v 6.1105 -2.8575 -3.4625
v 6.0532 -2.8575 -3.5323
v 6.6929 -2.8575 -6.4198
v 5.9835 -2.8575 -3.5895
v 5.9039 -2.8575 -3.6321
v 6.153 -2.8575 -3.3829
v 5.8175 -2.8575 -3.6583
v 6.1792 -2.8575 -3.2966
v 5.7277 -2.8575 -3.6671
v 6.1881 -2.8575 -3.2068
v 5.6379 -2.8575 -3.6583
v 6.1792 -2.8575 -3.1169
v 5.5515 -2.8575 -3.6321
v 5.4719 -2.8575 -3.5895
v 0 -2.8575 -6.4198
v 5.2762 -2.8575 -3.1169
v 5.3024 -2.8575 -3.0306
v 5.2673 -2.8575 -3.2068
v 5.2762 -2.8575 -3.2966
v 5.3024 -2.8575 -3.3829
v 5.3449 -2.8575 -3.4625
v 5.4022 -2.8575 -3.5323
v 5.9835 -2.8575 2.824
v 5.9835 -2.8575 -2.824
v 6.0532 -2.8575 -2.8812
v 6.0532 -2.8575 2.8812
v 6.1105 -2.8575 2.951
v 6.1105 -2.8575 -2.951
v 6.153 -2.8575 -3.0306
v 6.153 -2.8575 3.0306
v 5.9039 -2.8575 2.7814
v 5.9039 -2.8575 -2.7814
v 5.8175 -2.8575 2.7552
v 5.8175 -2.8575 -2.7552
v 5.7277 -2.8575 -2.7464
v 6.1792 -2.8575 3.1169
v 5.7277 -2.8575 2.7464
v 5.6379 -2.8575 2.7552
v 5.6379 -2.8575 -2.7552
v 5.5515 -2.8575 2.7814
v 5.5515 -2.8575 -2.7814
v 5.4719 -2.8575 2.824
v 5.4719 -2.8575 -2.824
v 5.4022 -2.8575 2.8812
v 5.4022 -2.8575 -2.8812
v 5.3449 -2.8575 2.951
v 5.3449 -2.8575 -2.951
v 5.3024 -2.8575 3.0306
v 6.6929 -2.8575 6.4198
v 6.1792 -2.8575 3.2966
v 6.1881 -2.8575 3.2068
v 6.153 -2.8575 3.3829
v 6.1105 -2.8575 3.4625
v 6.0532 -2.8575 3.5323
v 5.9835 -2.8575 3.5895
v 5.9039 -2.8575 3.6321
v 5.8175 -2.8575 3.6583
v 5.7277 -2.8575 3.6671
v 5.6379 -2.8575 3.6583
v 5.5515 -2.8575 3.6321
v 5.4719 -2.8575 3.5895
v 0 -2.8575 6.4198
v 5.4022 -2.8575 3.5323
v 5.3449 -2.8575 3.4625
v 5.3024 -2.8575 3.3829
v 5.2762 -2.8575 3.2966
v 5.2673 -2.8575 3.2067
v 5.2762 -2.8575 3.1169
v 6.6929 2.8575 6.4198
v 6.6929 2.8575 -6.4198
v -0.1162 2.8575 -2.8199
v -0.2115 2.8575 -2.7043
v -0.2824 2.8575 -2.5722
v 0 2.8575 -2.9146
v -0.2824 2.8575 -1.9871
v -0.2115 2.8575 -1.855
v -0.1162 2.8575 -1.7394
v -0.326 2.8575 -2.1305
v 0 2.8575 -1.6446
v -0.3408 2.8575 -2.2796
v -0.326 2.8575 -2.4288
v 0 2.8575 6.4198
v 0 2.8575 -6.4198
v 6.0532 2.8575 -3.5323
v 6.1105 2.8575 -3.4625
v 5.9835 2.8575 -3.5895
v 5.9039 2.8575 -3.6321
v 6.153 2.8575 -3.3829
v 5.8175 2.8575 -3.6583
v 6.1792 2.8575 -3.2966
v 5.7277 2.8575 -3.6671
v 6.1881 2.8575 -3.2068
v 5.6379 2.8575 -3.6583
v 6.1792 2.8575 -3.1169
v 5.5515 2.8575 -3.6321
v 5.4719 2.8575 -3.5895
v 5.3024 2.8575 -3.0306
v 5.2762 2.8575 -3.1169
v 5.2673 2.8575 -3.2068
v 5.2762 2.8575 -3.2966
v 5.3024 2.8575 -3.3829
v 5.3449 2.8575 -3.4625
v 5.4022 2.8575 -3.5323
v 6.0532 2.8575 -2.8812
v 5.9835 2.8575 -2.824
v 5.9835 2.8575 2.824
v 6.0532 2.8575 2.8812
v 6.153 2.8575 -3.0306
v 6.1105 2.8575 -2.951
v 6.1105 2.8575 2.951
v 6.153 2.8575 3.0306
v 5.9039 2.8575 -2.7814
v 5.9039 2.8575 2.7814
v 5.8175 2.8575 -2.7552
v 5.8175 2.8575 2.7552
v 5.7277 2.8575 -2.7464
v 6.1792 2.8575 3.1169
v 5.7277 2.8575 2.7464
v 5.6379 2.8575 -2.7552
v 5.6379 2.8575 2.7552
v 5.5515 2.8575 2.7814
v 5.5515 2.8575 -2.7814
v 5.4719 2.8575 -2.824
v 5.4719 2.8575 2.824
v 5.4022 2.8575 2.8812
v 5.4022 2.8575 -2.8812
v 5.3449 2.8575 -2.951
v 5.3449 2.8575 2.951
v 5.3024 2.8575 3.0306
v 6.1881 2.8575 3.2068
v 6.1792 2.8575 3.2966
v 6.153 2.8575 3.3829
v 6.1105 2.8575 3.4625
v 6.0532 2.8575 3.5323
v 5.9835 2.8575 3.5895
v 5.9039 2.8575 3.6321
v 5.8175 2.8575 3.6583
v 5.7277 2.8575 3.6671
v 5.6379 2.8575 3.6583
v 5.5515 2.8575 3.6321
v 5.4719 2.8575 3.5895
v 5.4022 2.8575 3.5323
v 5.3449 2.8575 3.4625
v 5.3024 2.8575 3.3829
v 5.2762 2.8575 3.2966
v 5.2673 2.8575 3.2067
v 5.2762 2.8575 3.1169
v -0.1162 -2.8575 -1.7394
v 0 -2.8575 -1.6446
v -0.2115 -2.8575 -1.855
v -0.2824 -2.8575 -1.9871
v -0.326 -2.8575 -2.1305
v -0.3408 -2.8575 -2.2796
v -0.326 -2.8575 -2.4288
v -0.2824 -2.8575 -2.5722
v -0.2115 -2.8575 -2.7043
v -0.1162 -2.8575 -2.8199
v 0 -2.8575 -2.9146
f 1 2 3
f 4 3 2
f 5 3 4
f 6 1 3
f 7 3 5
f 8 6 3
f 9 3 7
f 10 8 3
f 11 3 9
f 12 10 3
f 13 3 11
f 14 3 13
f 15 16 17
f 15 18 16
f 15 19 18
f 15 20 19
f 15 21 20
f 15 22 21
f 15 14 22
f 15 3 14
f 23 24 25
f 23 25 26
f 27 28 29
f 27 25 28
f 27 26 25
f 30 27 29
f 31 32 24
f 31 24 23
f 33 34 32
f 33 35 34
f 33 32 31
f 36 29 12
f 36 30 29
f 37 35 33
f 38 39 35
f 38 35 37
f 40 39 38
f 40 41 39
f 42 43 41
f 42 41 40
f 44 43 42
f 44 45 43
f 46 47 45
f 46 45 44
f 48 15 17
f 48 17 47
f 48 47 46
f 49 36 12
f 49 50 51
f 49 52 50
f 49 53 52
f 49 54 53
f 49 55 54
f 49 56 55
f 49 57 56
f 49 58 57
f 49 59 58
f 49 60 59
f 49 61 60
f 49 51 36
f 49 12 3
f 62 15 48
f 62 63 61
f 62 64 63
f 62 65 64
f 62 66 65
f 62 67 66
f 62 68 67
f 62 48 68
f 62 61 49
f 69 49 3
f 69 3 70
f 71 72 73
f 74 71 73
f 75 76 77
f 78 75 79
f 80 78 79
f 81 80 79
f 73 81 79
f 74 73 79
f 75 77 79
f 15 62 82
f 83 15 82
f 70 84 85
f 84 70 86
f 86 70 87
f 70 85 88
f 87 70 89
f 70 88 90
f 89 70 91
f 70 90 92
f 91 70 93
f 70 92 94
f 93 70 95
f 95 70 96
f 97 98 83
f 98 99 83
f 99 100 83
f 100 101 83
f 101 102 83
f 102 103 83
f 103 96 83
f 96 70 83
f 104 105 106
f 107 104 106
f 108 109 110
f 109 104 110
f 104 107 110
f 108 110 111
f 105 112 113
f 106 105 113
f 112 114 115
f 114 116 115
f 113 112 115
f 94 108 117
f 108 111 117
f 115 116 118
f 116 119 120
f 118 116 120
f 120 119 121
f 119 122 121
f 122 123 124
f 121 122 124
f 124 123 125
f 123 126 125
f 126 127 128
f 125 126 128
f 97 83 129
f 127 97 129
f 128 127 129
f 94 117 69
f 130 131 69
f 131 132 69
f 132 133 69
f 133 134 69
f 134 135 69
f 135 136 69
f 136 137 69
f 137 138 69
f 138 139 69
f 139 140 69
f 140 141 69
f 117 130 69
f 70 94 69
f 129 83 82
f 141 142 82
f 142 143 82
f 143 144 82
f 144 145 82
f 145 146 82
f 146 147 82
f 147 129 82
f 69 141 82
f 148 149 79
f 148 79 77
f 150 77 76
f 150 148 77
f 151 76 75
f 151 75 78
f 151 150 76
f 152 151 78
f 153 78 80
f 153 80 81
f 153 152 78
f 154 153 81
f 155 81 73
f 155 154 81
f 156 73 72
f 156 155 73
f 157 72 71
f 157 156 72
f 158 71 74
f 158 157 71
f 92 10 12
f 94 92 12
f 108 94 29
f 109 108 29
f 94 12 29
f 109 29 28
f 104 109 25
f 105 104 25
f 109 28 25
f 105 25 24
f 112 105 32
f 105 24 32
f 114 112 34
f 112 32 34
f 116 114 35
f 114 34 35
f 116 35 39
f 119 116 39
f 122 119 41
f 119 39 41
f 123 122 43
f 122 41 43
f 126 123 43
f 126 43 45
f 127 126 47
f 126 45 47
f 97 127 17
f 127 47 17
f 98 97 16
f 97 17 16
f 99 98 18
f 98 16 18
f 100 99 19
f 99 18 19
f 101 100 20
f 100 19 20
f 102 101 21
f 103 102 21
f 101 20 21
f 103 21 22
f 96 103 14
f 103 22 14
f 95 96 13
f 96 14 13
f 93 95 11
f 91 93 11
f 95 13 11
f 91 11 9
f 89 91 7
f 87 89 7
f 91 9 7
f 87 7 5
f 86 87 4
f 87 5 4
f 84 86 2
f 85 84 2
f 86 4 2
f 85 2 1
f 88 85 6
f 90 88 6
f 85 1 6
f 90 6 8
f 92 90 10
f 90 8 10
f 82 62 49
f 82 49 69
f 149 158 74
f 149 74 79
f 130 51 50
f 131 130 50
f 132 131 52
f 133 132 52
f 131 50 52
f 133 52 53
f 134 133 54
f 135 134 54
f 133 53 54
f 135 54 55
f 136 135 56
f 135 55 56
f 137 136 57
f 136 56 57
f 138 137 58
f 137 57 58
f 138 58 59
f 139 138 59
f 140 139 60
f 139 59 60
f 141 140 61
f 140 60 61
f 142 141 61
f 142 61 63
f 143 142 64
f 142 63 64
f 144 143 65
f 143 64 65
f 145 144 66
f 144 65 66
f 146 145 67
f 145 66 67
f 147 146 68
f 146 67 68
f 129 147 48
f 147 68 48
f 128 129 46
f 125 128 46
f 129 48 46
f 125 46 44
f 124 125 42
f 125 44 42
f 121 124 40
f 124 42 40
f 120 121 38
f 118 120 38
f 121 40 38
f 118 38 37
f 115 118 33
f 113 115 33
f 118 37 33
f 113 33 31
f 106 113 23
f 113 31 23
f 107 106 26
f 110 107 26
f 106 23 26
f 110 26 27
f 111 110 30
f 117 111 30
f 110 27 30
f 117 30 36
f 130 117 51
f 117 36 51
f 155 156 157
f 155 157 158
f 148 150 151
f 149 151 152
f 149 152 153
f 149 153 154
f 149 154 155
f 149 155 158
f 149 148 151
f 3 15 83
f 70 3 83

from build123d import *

# Parameters (mm, degrees)
F0_W     = 5.715
F0_H     = 12.8397
F1_DEPTH = 6.6929
F3_DEPTH = 5.715
F4_R     = 0.460375
F5_DEPTH = 5.715


with BuildPart() as f1:
    # F0 (on Right) → F1 (new body)
    with BuildSketch(Plane.YZ):
        Rectangle(F0_W, F0_H)
    extrude(amount=F1_DEPTH)

    # F4 (on face) → F5 (cut, through all)
    with BuildSketch(Plane.XZ.offset(2.8575)):
        with Locations((5.7277, 3.20675)):
            Circle(F4_R)
        with Locations((5.7277, -3.20675)):
            Circle(F4_R)
    extrude(amount=-F5_DEPTH, mode=Mode.SUBTRACT)


with BuildPart() as f3:
    # F2 (on face) → F3 (new body, through all)
    with BuildSketch(Plane.XZ.offset(2.8575)):
        with BuildLine():
            Line((0, -2.91465), (0, -1.64465))
            ThreePointArc((0, -1.64465), (-0.340789, -2.27965), (0, -2.91465))
        make_face()
    extrude(amount=-F3_DEPTH)


solid = Compound([f1.part, f3.part])
